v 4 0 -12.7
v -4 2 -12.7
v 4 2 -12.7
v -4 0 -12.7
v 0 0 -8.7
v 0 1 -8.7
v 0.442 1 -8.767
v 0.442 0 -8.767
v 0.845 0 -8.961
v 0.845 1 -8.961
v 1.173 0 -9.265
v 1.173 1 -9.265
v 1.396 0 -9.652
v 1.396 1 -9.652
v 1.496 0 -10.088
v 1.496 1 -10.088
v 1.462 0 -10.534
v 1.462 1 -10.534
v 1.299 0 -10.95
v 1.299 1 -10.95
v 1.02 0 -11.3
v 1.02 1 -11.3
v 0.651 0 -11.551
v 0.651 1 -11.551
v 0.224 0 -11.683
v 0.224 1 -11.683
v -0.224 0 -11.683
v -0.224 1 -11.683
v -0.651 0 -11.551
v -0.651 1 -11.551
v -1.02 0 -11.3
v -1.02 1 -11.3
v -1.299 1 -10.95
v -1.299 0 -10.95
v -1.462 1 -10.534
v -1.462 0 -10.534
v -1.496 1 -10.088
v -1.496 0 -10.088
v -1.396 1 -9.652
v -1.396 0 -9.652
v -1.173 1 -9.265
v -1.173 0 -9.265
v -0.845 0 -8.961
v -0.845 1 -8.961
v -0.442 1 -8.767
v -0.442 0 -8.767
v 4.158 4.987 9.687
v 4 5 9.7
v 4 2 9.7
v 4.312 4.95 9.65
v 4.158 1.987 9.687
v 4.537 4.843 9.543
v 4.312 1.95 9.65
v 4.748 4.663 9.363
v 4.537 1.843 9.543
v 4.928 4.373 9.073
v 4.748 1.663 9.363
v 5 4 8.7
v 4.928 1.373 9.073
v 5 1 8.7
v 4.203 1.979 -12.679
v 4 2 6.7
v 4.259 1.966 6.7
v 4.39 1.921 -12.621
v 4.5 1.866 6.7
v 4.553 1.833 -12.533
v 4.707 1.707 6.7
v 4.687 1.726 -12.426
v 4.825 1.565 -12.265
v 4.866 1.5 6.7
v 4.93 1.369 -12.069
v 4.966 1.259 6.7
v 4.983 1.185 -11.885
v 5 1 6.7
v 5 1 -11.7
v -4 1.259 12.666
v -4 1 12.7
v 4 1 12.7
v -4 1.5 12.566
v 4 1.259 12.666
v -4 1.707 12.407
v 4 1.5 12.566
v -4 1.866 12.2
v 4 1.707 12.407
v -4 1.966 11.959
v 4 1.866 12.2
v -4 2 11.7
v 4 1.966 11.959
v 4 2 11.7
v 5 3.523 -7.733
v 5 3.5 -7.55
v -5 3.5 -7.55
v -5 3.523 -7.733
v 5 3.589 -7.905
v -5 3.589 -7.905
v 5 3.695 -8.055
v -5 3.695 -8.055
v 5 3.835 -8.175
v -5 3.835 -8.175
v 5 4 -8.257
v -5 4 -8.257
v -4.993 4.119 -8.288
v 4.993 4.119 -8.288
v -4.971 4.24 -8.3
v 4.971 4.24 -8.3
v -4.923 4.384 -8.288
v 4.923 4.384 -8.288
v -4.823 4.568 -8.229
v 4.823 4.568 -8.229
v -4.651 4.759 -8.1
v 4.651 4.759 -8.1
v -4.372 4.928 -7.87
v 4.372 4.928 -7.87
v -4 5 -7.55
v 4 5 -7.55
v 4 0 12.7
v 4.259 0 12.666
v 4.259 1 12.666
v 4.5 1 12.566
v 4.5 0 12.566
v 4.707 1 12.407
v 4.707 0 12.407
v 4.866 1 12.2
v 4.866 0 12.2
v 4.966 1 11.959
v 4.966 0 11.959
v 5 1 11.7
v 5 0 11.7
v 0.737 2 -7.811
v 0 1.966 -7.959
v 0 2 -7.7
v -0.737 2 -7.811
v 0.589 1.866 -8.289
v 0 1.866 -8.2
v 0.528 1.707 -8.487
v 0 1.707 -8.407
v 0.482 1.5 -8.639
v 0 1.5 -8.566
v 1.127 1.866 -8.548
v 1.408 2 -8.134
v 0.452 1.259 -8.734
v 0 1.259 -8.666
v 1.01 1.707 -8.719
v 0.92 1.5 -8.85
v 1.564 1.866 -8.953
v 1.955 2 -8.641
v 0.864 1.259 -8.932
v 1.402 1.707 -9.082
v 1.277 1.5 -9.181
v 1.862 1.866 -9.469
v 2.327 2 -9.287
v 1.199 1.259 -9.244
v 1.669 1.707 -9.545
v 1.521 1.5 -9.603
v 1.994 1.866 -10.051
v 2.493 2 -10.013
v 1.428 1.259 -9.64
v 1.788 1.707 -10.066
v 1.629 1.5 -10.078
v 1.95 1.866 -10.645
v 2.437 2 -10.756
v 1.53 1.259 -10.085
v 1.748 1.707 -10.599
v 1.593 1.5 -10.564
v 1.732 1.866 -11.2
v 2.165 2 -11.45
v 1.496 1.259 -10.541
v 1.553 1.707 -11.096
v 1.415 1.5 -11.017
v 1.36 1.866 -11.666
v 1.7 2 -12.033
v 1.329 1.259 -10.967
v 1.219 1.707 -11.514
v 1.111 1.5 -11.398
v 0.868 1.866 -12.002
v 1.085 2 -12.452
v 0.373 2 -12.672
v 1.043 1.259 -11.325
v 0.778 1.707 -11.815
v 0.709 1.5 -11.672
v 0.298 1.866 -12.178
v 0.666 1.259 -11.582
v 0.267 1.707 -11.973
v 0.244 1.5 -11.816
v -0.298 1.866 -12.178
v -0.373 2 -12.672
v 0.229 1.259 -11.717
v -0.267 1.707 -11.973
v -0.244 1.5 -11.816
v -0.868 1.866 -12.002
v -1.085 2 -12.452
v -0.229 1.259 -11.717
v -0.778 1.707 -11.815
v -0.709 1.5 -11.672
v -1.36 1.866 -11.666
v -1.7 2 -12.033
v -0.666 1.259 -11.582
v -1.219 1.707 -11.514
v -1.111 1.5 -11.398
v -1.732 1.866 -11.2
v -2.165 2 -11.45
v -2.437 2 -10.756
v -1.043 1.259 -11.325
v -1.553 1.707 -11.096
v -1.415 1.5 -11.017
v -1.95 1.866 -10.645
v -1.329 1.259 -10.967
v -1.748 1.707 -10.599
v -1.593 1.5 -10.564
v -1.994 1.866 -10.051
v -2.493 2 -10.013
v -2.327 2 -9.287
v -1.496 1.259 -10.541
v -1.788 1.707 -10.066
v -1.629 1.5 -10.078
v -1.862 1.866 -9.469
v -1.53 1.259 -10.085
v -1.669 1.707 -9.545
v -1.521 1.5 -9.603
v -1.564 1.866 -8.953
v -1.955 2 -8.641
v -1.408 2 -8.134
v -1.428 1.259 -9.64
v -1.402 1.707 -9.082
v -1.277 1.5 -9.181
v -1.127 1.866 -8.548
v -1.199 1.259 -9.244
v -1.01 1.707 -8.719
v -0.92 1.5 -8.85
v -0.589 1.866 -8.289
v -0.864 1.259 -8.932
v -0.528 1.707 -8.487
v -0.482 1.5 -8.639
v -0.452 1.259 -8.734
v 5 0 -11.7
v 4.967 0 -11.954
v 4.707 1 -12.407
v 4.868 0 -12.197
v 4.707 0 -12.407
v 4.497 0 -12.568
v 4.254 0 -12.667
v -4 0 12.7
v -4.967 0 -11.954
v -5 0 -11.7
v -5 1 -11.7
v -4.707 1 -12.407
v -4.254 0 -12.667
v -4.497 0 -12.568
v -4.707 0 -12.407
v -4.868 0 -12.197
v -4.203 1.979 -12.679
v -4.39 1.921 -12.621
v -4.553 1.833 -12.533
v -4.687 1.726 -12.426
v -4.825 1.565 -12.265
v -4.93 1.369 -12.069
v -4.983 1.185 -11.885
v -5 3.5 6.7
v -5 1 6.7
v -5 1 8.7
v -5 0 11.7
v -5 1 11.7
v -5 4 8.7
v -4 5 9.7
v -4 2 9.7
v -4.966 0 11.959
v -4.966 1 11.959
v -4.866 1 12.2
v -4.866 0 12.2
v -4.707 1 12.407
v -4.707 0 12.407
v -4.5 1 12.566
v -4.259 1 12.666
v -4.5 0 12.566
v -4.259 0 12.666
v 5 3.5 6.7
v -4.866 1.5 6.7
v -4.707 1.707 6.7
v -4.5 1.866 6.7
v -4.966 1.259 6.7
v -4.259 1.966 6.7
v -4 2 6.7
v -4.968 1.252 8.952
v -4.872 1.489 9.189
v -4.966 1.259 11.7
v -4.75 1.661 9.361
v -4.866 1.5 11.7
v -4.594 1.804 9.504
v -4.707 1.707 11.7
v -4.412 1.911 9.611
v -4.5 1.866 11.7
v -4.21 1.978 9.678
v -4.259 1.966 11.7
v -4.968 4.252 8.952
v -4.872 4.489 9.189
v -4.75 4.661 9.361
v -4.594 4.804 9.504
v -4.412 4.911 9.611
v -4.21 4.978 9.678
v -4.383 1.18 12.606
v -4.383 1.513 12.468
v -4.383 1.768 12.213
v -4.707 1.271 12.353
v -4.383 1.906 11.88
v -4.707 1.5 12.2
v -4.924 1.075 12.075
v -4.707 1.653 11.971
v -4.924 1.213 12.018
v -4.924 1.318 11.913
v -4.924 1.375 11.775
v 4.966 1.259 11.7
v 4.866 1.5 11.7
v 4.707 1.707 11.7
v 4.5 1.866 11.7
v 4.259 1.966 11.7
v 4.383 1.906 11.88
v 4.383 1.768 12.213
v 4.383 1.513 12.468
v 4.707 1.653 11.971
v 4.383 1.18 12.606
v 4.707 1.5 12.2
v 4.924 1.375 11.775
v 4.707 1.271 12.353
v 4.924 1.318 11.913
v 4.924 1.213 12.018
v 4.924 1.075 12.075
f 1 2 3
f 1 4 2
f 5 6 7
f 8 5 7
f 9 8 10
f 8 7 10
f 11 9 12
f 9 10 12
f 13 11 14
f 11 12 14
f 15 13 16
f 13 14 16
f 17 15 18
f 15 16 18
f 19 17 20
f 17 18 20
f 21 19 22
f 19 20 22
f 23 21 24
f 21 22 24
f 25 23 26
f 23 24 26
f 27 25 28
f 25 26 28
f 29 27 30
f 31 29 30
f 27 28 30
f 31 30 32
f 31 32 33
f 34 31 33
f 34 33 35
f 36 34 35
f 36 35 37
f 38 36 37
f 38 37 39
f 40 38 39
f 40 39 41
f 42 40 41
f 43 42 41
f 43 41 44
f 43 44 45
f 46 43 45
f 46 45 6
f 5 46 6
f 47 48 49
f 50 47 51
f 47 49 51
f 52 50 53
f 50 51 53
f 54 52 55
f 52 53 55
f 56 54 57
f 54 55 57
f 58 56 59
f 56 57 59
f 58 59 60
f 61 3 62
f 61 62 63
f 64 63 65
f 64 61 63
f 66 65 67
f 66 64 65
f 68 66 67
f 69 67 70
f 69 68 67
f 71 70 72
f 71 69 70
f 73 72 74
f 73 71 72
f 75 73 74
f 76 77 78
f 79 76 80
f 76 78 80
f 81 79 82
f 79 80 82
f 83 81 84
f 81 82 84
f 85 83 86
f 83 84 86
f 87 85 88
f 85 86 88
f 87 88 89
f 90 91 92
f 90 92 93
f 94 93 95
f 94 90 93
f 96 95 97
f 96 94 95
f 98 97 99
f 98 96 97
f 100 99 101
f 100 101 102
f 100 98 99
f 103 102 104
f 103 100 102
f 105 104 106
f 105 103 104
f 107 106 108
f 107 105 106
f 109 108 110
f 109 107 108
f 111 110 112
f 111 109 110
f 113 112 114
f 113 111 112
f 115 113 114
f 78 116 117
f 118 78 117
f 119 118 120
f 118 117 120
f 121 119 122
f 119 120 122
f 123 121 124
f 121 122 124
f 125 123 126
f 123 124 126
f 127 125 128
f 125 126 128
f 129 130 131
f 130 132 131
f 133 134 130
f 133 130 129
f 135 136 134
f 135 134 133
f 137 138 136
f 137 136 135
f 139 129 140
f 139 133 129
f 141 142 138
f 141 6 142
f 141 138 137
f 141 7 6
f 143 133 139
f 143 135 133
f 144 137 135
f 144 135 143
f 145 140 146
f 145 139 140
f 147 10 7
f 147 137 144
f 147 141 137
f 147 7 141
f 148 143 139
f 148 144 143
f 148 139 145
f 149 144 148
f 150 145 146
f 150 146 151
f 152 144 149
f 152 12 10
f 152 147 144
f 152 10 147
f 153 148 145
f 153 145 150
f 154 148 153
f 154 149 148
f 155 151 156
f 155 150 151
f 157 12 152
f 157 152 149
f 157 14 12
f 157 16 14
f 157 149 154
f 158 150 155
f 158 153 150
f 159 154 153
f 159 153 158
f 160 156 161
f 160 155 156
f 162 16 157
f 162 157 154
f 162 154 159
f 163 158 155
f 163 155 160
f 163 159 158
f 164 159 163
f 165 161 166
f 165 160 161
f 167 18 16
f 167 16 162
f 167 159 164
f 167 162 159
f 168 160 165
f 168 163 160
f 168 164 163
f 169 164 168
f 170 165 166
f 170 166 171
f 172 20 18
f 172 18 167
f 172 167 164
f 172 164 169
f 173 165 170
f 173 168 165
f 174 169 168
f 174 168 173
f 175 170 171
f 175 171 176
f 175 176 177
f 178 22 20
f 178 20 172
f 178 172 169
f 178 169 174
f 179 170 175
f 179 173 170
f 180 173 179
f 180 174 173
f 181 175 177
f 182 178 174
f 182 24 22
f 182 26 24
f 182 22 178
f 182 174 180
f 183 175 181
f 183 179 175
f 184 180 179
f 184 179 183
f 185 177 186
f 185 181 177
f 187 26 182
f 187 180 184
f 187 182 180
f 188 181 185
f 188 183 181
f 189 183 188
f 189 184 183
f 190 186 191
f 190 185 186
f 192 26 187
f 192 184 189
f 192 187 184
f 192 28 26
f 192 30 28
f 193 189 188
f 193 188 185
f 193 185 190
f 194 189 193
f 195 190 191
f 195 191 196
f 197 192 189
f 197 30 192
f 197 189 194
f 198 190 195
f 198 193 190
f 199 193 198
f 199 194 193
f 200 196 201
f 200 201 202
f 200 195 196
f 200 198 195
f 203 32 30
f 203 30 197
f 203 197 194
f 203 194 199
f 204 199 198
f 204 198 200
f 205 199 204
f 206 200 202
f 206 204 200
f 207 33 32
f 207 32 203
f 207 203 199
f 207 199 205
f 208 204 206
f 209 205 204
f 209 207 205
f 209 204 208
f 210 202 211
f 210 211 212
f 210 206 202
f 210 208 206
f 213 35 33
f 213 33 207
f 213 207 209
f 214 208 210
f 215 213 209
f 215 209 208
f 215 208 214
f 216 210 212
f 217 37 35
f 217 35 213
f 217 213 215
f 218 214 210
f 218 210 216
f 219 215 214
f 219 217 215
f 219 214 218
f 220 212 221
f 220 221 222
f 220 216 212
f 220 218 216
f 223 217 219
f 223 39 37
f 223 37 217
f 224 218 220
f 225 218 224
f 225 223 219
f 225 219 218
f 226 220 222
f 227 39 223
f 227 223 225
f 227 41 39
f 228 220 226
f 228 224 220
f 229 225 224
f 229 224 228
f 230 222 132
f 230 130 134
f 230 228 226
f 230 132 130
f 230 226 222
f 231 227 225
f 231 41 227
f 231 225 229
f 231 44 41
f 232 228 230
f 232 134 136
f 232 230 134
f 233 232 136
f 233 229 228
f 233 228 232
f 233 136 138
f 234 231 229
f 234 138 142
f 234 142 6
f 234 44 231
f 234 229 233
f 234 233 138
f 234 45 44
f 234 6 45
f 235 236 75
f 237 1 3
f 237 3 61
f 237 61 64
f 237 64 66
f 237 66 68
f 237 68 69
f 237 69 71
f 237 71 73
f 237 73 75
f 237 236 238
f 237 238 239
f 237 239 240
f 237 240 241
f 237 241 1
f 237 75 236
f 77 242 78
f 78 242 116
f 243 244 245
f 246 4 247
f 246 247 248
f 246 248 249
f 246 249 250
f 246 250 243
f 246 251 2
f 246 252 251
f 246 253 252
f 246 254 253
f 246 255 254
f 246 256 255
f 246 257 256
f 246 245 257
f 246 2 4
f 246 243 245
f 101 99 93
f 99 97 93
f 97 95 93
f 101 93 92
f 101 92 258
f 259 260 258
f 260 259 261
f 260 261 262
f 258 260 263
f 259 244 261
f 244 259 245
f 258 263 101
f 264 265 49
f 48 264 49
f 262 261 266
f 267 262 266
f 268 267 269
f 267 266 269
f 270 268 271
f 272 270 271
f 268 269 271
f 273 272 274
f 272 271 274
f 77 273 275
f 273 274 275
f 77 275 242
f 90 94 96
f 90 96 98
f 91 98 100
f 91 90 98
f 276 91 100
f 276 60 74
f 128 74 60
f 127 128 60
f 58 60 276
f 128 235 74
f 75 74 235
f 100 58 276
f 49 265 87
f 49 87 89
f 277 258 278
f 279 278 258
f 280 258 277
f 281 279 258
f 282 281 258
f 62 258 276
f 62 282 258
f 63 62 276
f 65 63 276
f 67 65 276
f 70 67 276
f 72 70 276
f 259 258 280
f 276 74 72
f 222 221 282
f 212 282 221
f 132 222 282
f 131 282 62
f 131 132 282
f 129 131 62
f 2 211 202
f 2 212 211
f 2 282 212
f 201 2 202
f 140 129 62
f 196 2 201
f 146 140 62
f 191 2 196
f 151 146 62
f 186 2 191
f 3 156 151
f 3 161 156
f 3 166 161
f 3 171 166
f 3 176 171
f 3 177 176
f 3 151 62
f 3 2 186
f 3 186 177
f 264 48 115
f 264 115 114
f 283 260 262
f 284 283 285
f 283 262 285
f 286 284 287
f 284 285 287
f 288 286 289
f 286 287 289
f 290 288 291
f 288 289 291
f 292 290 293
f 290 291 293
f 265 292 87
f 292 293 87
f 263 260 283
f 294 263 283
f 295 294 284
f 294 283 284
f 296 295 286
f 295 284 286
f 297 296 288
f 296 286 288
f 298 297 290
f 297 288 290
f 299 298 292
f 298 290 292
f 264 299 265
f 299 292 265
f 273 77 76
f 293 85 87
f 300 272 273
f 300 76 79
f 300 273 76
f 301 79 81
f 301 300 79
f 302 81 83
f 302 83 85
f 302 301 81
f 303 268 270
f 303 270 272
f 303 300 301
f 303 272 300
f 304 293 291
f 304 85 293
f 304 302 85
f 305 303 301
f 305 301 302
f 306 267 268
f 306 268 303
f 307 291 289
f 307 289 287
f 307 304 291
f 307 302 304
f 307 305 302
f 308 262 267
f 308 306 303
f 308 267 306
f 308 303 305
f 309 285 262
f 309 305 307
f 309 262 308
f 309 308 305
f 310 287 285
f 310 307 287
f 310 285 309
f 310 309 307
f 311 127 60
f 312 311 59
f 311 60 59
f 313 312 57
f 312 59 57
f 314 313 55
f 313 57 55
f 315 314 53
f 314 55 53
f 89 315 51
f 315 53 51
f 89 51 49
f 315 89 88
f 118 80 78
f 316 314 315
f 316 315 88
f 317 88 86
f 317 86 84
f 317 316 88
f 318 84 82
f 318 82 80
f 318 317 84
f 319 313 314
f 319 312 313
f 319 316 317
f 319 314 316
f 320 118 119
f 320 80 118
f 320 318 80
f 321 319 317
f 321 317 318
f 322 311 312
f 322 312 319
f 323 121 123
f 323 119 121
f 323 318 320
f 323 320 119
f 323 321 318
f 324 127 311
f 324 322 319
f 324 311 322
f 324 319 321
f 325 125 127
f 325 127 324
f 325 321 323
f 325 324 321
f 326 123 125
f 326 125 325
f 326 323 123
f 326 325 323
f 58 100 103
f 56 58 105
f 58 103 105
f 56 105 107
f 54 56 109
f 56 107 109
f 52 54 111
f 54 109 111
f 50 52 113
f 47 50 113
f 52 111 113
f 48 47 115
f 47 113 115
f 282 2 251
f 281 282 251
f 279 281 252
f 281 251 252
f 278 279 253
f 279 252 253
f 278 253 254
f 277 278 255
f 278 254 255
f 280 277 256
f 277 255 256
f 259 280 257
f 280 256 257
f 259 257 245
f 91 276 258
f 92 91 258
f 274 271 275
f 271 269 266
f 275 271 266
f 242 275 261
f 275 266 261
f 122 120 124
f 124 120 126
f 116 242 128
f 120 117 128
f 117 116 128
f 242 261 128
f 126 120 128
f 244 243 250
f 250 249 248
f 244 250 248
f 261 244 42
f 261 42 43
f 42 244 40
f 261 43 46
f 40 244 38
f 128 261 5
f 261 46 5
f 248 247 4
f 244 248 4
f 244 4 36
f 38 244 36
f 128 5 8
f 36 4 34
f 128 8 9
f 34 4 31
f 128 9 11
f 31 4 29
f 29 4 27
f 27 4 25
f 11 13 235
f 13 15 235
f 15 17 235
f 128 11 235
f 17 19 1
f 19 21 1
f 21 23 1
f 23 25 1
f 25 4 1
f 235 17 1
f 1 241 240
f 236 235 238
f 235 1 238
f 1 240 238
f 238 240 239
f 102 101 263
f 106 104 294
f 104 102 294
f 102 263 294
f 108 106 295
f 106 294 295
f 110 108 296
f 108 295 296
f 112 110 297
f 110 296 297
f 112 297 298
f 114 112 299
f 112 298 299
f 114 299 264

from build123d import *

# Parameters (mm, degrees)
SKETCH1_W           = 10
SKETCH1_H           = 25.4
BOSS_EXTRUDE1_DEPTH = 2
SKETCH3_W           = 10
SKETCH3_H           = 3
BOSS_EXTRUDE3_DEPTH = 3
SKETCH4_W           = 10
SKETCH4_H           = 1.5
BOSS_EXTRUDE4_DEPTH = 15
SKETCH5_R           = 1.5
CUT_EXTRUDE1_DEPTH  = 14.974619852
FILLET2_R           = 1
FILLET4_RADIUS      = 0.75
FILLET4_LENGTH      = 10
FILLET5_R           = 1
FILLET6_R           = 1
FILLET7_R           = 1
FILLET8_START       = -1
FILLET8_DEPTH       = 5
FILLET9_START       = -1
FILLET9_DEPTH       = 4
FILLET10_R          = 1
FILLET11_R          = 1


with BuildPart() as part:
    # Sketch1 → Boss-Extrude1 (new body)
    with BuildSketch(Plane(origin=(0, 0, 0), x_dir=(1, 0, 0), z_dir=(0, 1, 0))):
        Rectangle(SKETCH1_W, SKETCH1_H)
    extrude(amount=BOSS_EXTRUDE1_DEPTH)

    # Sketch3 → Boss-Extrude3 (add)
    with BuildSketch(Plane(origin=(0, 2, 0), x_dir=(1, 0, 0), z_dir=(0, 1, 0))):
        with Locations((0, -8.2)):
            Rectangle(SKETCH3_W, SKETCH3_H)
    extrude(amount=BOSS_EXTRUDE3_DEPTH)

    # Sketch4 → Boss-Extrude4 (add)
    with BuildSketch(Plane(origin=(0, 0, 6.7), x_dir=(-1, 0, 0), z_dir=(0, 0, -1))):
        with Locations((0, 4.25)):
            Rectangle(SKETCH4_W, SKETCH4_H)
    extrude(amount=BOSS_EXTRUDE4_DEPTH)

    # Sketch5 → Cut-Extrude1 (cut, through all)
    with BuildSketch(Plane(origin=(0, 2, 0), x_dir=(1, 0, 0), z_dir=(0, 1, 0))):
        with Locations(Location((0, 10.2, 0), (0, 0, 270))):
            Circle(SKETCH5_R)
    extrude(amount=-CUT_EXTRUDE1_DEPTH, mode=Mode.SUBTRACT)

    # Fillet2
    fillet2_edges = [part.edges().sort_by_distance(p)[0] for p in [
        (0, 2, -11.7),
    ]]
    fillet(fillet2_edges, radius=FILLET2_R - 0.0001)  # a hair under: the kernel refuses the full size

    # Fillet4: full round fillet: the end face becomes a half cylinder, R = half its width
    fillet4_face = Plane((0, 4.25, -8.3), x_dir=(1, 0, 0), z_dir=(0, 0, -1))  # on the end face: x along it, z out of the body
    fillet4_slab = fillet4_face.offset(-FILLET4_RADIUS / 2) * Box(FILLET4_LENGTH, 2 * FILLET4_RADIUS, FILLET4_RADIUS, mode=Mode.PRIVATE)  # the body's end, R deep
    fillet4_round = Plane((0, 4.25, -7.55), x_dir=(0, 0, -1), z_dir=(1, 0, 0)) * Cylinder(FILLET4_RADIUS, FILLET4_LENGTH, mode=Mode.PRIVATE)  # its axis R under the face
    add(fillet4_slab - fillet4_round, mode=Mode.SUBTRACT)

    # Fillet5
    # the kernel refuses this fillet: 1 mm, written as the material it takes off along each edge
    with BuildSketch(Plane(origin=(7.5, 2, 12.7), x_dir=(0, -1, 0), z_dir=(-1, 0, 0))) as fillet5_piece_1:
        with BuildLine():
            CenterArc((FILLET5_R, -FILLET5_R), FILLET5_R, 90, 90)
            Line((0, -FILLET5_R), (0, 0))
            Line((0, 0), (FILLET5_R, 0))
        make_face()
    extrude(amount=15, mode=Mode.SUBTRACT)
    with BuildSketch(Plane(origin=(-5, 2, 15.2), x_dir=(1, 0, 0), z_dir=(0, 0, -1)), Plane(origin=(-5, 2, 9.7), x_dir=(1, 0, 0), z_dir=(0, 1, 0)), Plane(origin=(5, 2, 9.7), x_dir=(0, 0, -1), z_dir=(0, 1, 0))) as fillet5_piece_2:
        with BuildLine():
            CenterArc((FILLET5_R, FILLET5_R), FILLET5_R, 180, 90)
            Line((0, FILLET5_R), (0, 0))
            Line((0, 0), (FILLET5_R, 0))
        make_face()
    extrude(amount=5.5, mode=Mode.SUBTRACT)
    with BuildSketch(Plane(origin=(5, 5, -10.05), x_dir=(0, -1, 0), z_dir=(0, 0, 1))) as fillet5_piece_3:
        with BuildLine():
            CenterArc((FILLET5_R, -FILLET5_R), FILLET5_R, 90, 90)
            Line((0, -FILLET5_R), (0, 0))
            Line((0, 0), (FILLET5_R, 0))
        make_face()
    extrude(amount=22.25, mode=Mode.SUBTRACT)
    with BuildSketch(Plane(origin=(5, 2, 9.7), x_dir=(0, -1, 0), z_dir=(0, 0, 1))) as fillet5_piece_4:
        with BuildLine():
            CenterArc((FILLET5_R, -FILLET5_R), FILLET5_R, 90, 90)
            Line((0, -FILLET5_R), (0, 0))
            Line((0, 0), (FILLET5_R, 0))
        make_face()
    extrude(amount=5.5, mode=Mode.SUBTRACT)
    with BuildSketch(Plane(origin=(-5, 5, 12.2), x_dir=(1, 0, 0), z_dir=(0, 0, -1))) as fillet5_piece_5:
        with BuildLine():
            CenterArc((FILLET5_R, FILLET5_R), FILLET5_R, 180, 90)
            Line((0, FILLET5_R), (0, 0))
            Line((0, 0), (FILLET5_R, 0))
        make_face()
    extrude(amount=22.25, mode=Mode.SUBTRACT)
    with BuildSketch(Plane(origin=(-5, 2, 15.2), x_dir=(1, 0, 0), z_dir=(0, 0, -1))) as fillet5_piece_6a_section:
        with BuildLine():
            CenterArc((FILLET5_R, FILLET5_R), FILLET5_R, 180, 90)
            Line((0, FILLET5_R), (0, 0))
            Line((0, 0), (FILLET5_R, 0))
        make_face()
    fillet5_piece_6a = extrude(amount=8, mode=Mode.PRIVATE)
    fillet5_piece_6a = split(fillet5_piece_6a, bisect_by=Plane(origin=(-5, 2, 9.7), z_dir=(0, 0, -1)), keep=Keep.TOP, mode=Mode.PRIVATE)
    with BuildSketch(Plane(origin=(-5, -0.5, 9.7), x_dir=(1, 0, 0), z_dir=(0, 1, 0))) as fillet5_piece_6b_section:
        with BuildLine():
            CenterArc((FILLET5_R, FILLET5_R), FILLET5_R, 180, 90)
            Line((0, FILLET5_R), (0, 0))
            Line((0, 0), (FILLET5_R, 0))
        make_face()
    fillet5_piece_6b = extrude(amount=8, mode=Mode.PRIVATE)
    fillet5_piece_6b = split(fillet5_piece_6b, bisect_by=Plane(origin=(-5, 2, 9.7), z_dir=(0, -1, 0)), keep=Keep.TOP, mode=Mode.PRIVATE)
    fillet5_piece_6 = fillet5_piece_6a & fillet5_piece_6b
    add(fillet5_piece_6, mode=Mode.SUBTRACT)
    with BuildSketch(Plane(origin=(5, -0.5, 9.7), x_dir=(0, 0, -1), z_dir=(0, 1, 0))) as fillet5_piece_7a_section:
        with BuildLine():
            CenterArc((FILLET5_R, FILLET5_R), FILLET5_R, 180, 90)
            Line((0, FILLET5_R), (0, 0))
            Line((0, 0), (FILLET5_R, 0))
        make_face()
    fillet5_piece_7a = extrude(amount=8, mode=Mode.PRIVATE)
    fillet5_piece_7a = split(fillet5_piece_7a, bisect_by=Plane(origin=(5, 2, 9.7), z_dir=(0, -1, 0)), keep=Keep.TOP, mode=Mode.PRIVATE)
    with BuildSketch(Plane(origin=(5, 2, 7.2), x_dir=(0, -1, 0), z_dir=(0, 0, 1))) as fillet5_piece_7b_section:
        with BuildLine():
            CenterArc((FILLET5_R, -FILLET5_R), FILLET5_R, 90, 90)
            Line((0, -FILLET5_R), (0, 0))
            Line((0, 0), (FILLET5_R, 0))
        make_face()
    fillet5_piece_7b = extrude(amount=8, mode=Mode.PRIVATE)
    fillet5_piece_7b = split(fillet5_piece_7b, bisect_by=Plane(origin=(5, 2, 9.7), z_dir=(0, 0, -1)), keep=Keep.TOP, mode=Mode.PRIVATE)
    fillet5_piece_7 = fillet5_piece_7a & fillet5_piece_7b
    add(fillet5_piece_7, mode=Mode.SUBTRACT)

    # Fillet6
    fillet6_edges = [part.edges().sort_by_distance(p)[0] for p in [
        (-5, 2, -3),
    ]]
    fillet(fillet6_edges, radius=FILLET6_R)

    # Fillet7
    fillet7_edges = [part.edges().sort_by_distance(p)[0] for p in [
        (5, 2, -3),
    ]]
    fillet(fillet7_edges, radius=FILLET7_R)

    # Fillet8: read off the stored shape, not the designer's step
    # Fillet8 outline → Fillet8 (cut)
    with BuildSketch(Plane(origin=(0, 0, 0), x_dir=(1, 0, 0), z_dir=(0, 1, 0)).offset(FILLET8_START)):
        with BuildLine():
            Line((-5, 12.7), (-5, 11.7))
            add(Edge.make_bspline(
                [(-5, 11.7), (-5, 12.7), (-4, 12.7)],
                knots=[0, 0, 0, 1, 1, 1], degree=2, weights=[1, 0.707106781, 1]))
            Line((-4, 12.7), (-5, 12.7))
        make_face()
    extrude(amount=FILLET8_DEPTH, mode=Mode.SUBTRACT)

    # Fillet9: read off the stored shape, not the designer's step
    # Fillet9 outline → Fillet9 (cut)
    with BuildSketch(Plane(origin=(0, 0, 0), x_dir=(1, 0, 0), z_dir=(0, 1, 0)).offset(FILLET9_START)):
        with BuildLine():
            Line((5, 12.7), (4, 12.7))
            add(Edge.make_bspline(
                [(4, 12.7), (5, 12.7), (5, 11.7)],
                knots=[0, 0, 0, 1, 1, 1], degree=2, weights=[1, 0.707106781, 1]))
            Line((5, 11.7), (5, 12.7))
        make_face()
    extrude(amount=FILLET9_DEPTH, mode=Mode.SUBTRACT)

    # Fillet10
    # the kernel refuses this fillet: 1 mm, written as the material it takes off along each edge
    with BuildSketch(Plane(origin=(-4, 1, 11.7), x_dir=(0, 0, 1), z_dir=(-1, 0, 0))) as fillet10_piece_1_section:
        Polygon((0, 0), (FILLET10_R, 0), (FILLET10_R, FILLET10_R), (0, FILLET10_R), align=None)
    fillet10_piece_1 = extrude(amount=FILLET10_R, mode=Mode.PRIVATE)
    fillet10_piece_1 = fillet10_piece_1 - Plane(origin=(-4, 1, 11.7), x_dir=(0, -0.7071067811865475, -0.7071067811865475), z_dir=(-1, 0, 0)) * Sphere(FILLET10_R, mode=Mode.PRIVATE)
    add(fillet10_piece_1, mode=Mode.SUBTRACT)
    with BuildSketch(Plane(origin=(-5, -2.5, 12.7), x_dir=(0, 0, -1), z_dir=(0, 1, 0))) as fillet10_piece_2:
        with BuildLine():
            CenterArc((FILLET10_R, -FILLET10_R), FILLET10_R, 90, 90)
            Line((0, -FILLET10_R), (0, 0))
            Line((0, 0), (FILLET10_R, 0))
        make_face()
    extrude(amount=3.5, mode=Mode.SUBTRACT)

    # Fillet11
    # the kernel refuses this fillet: 1 mm, written as the material it takes off along each edge
    with BuildSketch(Plane(origin=(4, 1, 11.7), x_dir=(0, 0, 1), z_dir=(1, 0, 0))) as fillet11_piece_1_section:
        Polygon((0, 0), (FILLET11_R, 0), (FILLET11_R, -FILLET11_R), (0, -FILLET11_R), align=None)
    fillet11_piece_1 = extrude(amount=FILLET11_R, mode=Mode.PRIVATE)
    fillet11_piece_1 = fillet11_piece_1 - Plane(origin=(4, 1, 11.7), x_dir=(0, -0.7071067811865475, -0.7071067811865475), z_dir=(1, 0, 0)) * Sphere(FILLET11_R, mode=Mode.PRIVATE)
    add(fillet11_piece_1, mode=Mode.SUBTRACT)
    with BuildSketch(Plane(origin=(5, -2.5, 12.7), x_dir=(0, 0, -1), z_dir=(0, 1, 0))) as fillet11_piece_2:
        with BuildLine():
            CenterArc((FILLET11_R, FILLET11_R), FILLET11_R, 180, 90)
            Line((0, FILLET11_R), (0, 0))
            Line((0, 0), (FILLET11_R, 0))
        make_face()
    extrude(amount=3.5, mode=Mode.SUBTRACT)


solid = part.part
